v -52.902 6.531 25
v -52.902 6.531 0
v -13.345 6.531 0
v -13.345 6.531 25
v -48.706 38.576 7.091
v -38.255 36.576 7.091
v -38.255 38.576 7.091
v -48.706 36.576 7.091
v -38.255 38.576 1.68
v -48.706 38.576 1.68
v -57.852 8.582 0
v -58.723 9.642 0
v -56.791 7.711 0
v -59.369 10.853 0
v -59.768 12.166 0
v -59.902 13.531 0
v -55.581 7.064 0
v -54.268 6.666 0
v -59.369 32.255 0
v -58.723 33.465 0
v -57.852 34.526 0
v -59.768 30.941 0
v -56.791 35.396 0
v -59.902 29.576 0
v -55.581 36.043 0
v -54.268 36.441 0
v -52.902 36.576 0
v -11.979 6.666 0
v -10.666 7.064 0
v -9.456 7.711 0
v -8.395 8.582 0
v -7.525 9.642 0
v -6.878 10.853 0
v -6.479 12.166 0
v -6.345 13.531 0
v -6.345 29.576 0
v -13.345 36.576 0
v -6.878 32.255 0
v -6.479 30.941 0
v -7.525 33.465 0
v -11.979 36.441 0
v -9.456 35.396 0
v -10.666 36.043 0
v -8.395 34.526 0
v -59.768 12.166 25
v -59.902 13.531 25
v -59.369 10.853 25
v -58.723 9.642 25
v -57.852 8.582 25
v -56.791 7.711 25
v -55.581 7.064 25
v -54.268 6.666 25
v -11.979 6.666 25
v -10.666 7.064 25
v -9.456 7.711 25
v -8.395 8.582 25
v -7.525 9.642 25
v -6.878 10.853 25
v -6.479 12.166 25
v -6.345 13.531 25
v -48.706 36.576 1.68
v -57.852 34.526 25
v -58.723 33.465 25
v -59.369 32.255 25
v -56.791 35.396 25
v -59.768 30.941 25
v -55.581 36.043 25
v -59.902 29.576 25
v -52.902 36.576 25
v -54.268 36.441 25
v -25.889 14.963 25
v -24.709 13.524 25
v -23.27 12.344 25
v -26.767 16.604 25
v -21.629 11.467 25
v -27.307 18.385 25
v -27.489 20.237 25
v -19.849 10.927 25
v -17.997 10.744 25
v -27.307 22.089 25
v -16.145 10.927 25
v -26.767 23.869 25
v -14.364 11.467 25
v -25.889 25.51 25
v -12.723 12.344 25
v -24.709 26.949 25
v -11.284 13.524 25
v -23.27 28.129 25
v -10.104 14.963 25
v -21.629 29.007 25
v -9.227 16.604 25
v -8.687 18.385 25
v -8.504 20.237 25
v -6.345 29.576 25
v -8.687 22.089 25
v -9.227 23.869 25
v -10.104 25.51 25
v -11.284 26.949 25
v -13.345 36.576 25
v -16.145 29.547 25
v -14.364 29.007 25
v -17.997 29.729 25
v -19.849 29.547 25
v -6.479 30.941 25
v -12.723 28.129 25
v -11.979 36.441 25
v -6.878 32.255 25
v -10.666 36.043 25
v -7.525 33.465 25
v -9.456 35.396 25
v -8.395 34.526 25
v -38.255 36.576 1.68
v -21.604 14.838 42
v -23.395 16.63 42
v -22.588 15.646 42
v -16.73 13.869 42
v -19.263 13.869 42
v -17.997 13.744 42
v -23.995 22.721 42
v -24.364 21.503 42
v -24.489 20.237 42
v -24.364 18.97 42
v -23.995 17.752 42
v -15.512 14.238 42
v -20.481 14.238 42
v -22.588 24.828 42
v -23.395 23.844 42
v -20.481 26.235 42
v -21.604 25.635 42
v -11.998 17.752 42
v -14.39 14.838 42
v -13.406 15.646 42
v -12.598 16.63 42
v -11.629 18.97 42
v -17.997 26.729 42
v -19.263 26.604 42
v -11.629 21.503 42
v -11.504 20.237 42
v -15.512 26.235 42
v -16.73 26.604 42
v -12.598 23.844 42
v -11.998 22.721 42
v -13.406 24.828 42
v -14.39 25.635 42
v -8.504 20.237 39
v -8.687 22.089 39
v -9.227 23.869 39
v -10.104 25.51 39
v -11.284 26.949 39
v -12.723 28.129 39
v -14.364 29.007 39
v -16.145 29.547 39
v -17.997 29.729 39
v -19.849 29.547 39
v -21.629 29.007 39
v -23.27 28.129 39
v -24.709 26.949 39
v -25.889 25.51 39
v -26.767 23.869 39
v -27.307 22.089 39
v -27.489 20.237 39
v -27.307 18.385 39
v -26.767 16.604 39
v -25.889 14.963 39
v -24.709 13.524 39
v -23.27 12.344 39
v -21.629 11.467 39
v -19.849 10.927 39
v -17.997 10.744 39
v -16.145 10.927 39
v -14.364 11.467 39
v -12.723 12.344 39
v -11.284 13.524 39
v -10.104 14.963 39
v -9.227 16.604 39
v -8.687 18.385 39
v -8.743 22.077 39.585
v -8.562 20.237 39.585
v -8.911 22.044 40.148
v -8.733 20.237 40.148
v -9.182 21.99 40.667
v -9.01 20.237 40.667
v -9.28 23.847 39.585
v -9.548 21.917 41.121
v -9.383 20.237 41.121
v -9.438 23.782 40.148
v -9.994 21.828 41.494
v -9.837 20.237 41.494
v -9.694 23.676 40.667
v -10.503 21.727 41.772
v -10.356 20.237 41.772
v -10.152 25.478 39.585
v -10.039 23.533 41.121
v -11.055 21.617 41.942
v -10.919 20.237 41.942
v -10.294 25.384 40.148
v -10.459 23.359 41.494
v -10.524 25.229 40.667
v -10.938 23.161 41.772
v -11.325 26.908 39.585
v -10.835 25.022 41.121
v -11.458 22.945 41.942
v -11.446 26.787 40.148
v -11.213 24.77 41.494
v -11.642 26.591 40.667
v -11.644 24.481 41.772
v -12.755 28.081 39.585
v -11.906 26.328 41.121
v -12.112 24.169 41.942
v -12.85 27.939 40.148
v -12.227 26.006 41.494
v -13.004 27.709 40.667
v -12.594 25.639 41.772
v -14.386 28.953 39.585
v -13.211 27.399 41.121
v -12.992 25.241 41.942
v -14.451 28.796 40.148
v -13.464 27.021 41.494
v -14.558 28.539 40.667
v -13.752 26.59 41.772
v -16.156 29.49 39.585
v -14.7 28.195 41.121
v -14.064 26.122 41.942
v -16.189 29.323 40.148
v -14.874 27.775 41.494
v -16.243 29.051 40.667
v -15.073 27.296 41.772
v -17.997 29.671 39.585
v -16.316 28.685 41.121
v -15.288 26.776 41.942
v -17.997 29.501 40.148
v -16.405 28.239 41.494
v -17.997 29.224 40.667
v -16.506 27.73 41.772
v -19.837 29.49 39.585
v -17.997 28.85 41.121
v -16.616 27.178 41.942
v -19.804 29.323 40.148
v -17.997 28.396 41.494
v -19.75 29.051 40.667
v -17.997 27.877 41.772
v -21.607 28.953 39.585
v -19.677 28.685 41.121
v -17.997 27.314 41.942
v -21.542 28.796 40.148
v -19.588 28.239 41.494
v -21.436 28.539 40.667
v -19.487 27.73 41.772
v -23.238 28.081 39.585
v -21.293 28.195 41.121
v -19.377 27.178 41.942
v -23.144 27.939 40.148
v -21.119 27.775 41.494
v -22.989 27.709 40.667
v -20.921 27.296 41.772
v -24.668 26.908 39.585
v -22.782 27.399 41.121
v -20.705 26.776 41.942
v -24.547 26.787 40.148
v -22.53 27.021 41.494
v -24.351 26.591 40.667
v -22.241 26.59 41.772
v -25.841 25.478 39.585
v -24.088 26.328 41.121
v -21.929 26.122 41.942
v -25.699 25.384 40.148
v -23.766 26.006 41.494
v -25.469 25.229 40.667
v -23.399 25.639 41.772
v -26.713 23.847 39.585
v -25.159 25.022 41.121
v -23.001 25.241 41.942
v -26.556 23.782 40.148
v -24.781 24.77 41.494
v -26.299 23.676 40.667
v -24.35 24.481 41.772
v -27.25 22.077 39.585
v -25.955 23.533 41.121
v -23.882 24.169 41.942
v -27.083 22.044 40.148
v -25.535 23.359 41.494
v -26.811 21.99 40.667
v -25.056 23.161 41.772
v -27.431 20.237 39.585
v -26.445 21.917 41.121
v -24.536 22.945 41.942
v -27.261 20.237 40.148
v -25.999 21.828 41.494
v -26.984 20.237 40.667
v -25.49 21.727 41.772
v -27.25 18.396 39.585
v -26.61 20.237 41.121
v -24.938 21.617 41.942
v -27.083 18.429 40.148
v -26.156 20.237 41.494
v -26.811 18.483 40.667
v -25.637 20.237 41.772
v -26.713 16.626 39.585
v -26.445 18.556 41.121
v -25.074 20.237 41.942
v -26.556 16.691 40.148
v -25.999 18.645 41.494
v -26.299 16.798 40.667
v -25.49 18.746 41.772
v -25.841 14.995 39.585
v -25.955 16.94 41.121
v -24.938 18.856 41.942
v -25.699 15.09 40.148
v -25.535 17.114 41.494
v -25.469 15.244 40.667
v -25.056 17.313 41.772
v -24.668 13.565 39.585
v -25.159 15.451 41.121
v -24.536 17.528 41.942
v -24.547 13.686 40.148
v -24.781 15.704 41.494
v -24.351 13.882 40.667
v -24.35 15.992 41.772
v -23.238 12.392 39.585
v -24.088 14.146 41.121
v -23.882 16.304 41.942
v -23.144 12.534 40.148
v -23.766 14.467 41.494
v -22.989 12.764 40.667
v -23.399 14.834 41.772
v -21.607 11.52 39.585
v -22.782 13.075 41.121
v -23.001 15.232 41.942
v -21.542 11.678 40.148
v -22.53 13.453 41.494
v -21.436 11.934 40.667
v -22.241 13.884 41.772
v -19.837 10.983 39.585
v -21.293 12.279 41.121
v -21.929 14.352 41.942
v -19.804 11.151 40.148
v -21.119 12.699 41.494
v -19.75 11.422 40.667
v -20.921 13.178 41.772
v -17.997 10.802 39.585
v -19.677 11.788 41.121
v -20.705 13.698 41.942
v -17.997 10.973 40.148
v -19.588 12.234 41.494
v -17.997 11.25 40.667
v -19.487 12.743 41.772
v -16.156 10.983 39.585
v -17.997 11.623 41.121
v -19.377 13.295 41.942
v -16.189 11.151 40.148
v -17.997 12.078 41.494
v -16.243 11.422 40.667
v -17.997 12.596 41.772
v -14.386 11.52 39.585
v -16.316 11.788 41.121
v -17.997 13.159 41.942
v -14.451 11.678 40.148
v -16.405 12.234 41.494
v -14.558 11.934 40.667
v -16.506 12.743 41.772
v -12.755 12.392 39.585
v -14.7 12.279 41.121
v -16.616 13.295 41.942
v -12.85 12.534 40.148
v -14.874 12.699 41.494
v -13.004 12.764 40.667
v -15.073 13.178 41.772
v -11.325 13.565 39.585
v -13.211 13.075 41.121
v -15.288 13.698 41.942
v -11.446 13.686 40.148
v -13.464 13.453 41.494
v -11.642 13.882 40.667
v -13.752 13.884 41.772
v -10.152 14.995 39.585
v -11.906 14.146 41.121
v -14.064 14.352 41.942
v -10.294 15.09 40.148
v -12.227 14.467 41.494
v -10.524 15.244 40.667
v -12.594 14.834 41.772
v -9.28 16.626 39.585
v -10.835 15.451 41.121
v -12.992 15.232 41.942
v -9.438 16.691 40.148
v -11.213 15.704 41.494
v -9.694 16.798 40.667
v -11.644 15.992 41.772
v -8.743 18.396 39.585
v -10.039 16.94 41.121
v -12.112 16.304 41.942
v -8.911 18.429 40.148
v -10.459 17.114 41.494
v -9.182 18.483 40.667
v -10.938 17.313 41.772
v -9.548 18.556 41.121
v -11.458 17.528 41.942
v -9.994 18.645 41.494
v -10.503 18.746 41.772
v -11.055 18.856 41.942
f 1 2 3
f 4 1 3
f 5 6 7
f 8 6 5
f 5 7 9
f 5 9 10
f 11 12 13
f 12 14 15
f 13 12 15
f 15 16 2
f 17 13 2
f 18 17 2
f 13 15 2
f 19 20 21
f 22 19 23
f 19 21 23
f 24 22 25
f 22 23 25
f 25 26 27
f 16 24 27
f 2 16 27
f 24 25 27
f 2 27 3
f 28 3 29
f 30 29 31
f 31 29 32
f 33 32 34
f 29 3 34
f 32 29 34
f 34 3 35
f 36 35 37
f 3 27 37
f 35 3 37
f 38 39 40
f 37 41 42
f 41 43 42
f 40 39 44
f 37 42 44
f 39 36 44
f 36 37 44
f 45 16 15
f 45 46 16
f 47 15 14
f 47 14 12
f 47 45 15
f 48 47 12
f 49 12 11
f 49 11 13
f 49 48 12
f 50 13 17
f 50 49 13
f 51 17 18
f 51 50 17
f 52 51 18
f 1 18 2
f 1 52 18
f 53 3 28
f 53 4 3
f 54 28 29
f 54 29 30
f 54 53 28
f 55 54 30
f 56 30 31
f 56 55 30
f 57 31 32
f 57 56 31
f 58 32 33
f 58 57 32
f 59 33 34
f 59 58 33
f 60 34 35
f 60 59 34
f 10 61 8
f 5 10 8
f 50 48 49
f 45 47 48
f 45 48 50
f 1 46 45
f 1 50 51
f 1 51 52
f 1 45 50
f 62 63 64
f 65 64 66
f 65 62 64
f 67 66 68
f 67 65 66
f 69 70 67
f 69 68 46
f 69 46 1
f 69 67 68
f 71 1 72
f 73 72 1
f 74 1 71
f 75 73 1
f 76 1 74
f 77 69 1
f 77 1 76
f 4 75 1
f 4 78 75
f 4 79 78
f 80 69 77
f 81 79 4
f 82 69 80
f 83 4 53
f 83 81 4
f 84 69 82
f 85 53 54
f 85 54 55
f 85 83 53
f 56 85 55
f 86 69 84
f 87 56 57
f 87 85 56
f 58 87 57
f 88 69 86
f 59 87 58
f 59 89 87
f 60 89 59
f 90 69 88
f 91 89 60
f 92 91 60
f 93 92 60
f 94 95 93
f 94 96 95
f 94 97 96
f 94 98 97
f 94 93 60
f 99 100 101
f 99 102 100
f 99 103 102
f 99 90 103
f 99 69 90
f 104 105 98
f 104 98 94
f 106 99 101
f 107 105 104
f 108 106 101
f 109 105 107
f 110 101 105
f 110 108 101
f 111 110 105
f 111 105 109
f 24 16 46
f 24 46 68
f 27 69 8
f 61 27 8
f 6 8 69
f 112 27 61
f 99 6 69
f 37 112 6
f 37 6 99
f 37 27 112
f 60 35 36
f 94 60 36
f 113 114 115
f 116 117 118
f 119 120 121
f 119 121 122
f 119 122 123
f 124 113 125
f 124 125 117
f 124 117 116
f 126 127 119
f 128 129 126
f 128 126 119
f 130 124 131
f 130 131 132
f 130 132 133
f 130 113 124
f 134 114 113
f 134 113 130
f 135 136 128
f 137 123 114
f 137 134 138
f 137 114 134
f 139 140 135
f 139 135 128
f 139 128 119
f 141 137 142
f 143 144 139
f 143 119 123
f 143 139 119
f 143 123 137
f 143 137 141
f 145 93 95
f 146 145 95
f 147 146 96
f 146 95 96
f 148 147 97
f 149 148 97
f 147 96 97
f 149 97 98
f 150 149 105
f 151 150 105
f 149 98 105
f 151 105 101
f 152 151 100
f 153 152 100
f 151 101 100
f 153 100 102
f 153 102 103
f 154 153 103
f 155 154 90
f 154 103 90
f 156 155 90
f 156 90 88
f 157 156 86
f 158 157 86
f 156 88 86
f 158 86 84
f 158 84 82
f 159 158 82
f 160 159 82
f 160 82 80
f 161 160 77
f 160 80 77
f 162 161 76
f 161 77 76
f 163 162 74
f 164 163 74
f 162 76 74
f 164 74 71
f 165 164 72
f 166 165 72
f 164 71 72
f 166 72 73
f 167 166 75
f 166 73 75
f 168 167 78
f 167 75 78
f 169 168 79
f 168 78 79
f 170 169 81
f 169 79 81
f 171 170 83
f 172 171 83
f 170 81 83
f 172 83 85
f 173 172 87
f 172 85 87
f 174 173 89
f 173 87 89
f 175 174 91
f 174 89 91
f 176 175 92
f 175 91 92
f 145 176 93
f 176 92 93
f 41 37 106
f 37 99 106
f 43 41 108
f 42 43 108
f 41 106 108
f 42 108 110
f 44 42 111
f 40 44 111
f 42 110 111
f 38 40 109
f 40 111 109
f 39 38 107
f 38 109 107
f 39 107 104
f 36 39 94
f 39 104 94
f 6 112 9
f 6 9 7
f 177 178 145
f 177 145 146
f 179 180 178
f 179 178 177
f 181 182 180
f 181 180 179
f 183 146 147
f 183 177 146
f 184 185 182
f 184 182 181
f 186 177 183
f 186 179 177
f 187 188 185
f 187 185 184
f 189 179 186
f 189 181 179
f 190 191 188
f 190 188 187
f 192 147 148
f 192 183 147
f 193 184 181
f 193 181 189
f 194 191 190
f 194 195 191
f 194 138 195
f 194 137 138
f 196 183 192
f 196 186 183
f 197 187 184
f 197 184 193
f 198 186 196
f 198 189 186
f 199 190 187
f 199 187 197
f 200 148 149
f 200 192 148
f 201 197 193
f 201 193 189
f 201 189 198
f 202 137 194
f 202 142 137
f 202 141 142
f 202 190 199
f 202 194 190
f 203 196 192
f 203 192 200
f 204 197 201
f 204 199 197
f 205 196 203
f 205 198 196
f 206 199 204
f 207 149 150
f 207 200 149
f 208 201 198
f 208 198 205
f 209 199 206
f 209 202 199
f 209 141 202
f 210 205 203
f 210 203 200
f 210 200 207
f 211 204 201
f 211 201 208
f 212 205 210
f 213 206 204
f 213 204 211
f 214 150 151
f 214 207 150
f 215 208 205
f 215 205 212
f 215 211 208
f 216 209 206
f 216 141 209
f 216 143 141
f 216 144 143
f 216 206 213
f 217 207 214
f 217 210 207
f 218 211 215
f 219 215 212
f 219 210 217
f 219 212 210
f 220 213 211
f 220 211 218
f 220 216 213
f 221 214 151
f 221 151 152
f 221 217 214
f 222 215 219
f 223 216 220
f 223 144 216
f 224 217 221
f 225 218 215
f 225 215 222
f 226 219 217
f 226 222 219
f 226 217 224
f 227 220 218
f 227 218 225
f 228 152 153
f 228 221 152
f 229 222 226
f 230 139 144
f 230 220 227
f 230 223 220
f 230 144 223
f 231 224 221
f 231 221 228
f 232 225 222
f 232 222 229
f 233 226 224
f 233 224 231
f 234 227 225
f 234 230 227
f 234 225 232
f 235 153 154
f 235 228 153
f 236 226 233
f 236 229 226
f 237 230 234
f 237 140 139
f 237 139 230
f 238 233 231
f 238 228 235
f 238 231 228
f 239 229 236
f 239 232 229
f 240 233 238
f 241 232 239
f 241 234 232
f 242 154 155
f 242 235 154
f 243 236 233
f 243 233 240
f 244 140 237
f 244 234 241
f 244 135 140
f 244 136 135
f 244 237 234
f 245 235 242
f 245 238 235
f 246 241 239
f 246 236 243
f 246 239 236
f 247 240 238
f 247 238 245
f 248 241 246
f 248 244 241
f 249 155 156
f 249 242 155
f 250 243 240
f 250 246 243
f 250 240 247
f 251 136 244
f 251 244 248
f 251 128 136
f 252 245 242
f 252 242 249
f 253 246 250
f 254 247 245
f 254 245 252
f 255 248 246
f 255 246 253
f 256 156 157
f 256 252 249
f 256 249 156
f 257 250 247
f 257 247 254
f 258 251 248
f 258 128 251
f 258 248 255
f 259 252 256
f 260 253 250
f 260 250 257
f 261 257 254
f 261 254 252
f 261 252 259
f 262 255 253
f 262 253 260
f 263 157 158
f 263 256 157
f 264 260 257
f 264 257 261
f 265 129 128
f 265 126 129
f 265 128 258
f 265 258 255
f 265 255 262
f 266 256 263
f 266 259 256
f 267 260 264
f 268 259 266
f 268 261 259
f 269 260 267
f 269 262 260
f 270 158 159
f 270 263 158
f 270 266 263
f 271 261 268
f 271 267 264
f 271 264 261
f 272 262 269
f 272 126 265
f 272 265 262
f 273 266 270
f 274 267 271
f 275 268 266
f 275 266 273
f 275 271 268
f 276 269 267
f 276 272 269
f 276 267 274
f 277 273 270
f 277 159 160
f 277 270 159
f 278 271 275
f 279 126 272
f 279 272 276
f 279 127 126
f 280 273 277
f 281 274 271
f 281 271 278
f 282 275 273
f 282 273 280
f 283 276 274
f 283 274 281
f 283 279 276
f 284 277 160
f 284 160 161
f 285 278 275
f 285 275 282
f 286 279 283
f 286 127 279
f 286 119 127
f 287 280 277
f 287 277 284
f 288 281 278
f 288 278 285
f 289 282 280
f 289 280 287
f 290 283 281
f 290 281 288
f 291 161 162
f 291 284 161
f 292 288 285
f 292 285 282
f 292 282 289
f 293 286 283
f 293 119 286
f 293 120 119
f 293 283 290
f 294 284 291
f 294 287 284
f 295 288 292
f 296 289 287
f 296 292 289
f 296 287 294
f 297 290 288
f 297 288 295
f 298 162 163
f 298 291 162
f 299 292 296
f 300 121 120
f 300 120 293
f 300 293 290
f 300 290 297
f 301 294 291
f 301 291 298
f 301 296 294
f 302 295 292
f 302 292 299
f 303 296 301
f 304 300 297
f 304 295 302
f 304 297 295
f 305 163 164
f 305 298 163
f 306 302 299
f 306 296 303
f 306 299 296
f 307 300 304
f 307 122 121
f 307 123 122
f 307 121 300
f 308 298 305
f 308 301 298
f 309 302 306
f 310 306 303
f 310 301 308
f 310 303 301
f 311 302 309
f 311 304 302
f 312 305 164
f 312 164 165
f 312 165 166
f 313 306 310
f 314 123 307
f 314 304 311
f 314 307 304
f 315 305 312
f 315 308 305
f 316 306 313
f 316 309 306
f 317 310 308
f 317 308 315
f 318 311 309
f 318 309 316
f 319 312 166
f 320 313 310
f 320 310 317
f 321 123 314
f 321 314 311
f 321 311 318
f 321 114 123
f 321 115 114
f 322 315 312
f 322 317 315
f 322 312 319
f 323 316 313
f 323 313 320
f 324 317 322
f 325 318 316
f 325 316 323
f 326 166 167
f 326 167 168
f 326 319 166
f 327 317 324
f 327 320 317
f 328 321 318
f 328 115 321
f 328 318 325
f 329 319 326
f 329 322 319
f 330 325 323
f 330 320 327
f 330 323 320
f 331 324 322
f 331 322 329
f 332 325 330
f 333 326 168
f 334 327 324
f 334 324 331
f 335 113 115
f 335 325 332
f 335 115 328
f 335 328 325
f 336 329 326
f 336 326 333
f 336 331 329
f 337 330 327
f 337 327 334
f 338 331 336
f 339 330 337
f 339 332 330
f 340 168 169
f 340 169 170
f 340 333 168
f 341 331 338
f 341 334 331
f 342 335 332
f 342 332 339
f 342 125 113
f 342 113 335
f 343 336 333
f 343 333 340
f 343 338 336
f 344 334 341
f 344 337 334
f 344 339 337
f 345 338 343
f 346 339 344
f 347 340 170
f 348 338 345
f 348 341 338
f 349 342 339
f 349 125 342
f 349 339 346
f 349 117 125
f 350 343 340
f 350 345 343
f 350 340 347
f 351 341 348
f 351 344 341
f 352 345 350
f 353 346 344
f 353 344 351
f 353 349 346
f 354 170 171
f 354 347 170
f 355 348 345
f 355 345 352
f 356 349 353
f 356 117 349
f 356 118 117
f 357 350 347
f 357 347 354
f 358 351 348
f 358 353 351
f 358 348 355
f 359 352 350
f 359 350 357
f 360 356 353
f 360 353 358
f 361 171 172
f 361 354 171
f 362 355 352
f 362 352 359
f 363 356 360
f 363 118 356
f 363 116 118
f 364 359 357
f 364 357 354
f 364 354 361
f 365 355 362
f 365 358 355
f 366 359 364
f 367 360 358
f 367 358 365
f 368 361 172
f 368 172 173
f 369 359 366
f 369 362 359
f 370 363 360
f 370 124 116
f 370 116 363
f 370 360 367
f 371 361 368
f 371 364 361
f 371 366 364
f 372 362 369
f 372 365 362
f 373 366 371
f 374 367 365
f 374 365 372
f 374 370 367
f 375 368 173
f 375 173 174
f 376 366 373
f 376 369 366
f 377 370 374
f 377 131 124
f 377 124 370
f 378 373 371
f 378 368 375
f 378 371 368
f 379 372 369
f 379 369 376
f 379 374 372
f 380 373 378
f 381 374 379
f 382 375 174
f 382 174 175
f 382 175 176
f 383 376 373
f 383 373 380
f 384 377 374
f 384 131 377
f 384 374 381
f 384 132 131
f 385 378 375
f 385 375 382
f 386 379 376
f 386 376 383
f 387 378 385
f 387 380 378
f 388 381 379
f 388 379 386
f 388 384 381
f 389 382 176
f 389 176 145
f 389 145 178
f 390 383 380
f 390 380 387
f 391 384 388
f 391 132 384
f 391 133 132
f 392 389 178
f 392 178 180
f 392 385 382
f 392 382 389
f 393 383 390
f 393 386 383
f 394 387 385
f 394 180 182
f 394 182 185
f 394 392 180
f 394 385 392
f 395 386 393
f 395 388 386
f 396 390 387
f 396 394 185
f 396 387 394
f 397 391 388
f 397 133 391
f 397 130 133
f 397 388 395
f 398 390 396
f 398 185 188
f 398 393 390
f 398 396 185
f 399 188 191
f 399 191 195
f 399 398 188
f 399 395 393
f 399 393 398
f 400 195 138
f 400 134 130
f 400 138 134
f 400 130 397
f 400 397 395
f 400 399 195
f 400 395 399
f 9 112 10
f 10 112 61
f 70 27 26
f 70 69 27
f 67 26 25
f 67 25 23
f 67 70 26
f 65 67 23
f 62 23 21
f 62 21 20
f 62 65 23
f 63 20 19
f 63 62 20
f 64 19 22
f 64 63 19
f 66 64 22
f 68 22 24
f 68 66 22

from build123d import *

# Parameters (mm, degrees)
F0_W      = 53.5574629903
F0_H      = 30.0444331951
F1_DEPTH  = 25
F2_R      = 9.492451093
F3_DEPTH  = 17
F4_R      = 3
F5_R      = 7
F6_R      = 7
F7_R      = 7
F8_R      = 7
F11_W     = 10.4502402246
F11_H     = 5.4117300315
F12_DEPTH = 2


# Not quite as in the source:
# - the program builds the solid bodies; features that only make, move or delete a surface that nothing else refers to are left out


with BuildPart() as f1:
    # F0 (on Top) → F1 (new body)
    with BuildSketch(Plane.XY):
        with Locations((-33.1235192716, 21.5536148753)):
            Rectangle(F0_W, F0_H)
    extrude(amount=F1_DEPTH)

    # F2 (on face) → F3 (join)
    with BuildSketch(Plane.XY.offset(25)):
        with Locations((-17.996661365, 20.2366635203)):
            Circle(F2_R)
    extrude(amount=F3_DEPTH)

    # F4
    f4_edges = [f1.edges().sort_by_distance(p)[0] for p in [
        (-27.489112, 20.236664, 42),
    ]]
    fillet(f4_edges, radius=F4_R)

    # F5
    f5_edges = [f1.edges().sort_by_distance(p)[0] for p in [
        (-6.344788, 36.575831, 12.5),
    ]]
    fillet(f5_edges, radius=F5_R)

    # F6
    f6_edges = [f1.edges().sort_by_distance(p)[0] for p in [
        (-59.902251, 36.575831, 12.5),
    ]]
    fillet(f6_edges, radius=F6_R)

    # F7
    f7_edges = [f1.edges().sort_by_distance(p)[0] for p in [
        (-59.902251, 6.531398, 12.5),
    ]]
    fillet(f7_edges, radius=F7_R)

    # F8
    f8_edges = [f1.edges().sort_by_distance(p)[0] for p in [
        (-6.344788, 6.531398, 12.5),
    ]]
    fillet(f8_edges, radius=F8_R)

    # F11 (on face) → F12 (join)
    with BuildSketch(Plane(origin=(0, 36.5758314729, 0), x_dir=(-1, 0, 0), z_dir=(0, 1, 0))):
        with Locations((43.4804502875, 4.3853675597)):
            Rectangle(F11_W, F11_H)
    extrude(amount=F12_DEPTH)


solid = f1.part
